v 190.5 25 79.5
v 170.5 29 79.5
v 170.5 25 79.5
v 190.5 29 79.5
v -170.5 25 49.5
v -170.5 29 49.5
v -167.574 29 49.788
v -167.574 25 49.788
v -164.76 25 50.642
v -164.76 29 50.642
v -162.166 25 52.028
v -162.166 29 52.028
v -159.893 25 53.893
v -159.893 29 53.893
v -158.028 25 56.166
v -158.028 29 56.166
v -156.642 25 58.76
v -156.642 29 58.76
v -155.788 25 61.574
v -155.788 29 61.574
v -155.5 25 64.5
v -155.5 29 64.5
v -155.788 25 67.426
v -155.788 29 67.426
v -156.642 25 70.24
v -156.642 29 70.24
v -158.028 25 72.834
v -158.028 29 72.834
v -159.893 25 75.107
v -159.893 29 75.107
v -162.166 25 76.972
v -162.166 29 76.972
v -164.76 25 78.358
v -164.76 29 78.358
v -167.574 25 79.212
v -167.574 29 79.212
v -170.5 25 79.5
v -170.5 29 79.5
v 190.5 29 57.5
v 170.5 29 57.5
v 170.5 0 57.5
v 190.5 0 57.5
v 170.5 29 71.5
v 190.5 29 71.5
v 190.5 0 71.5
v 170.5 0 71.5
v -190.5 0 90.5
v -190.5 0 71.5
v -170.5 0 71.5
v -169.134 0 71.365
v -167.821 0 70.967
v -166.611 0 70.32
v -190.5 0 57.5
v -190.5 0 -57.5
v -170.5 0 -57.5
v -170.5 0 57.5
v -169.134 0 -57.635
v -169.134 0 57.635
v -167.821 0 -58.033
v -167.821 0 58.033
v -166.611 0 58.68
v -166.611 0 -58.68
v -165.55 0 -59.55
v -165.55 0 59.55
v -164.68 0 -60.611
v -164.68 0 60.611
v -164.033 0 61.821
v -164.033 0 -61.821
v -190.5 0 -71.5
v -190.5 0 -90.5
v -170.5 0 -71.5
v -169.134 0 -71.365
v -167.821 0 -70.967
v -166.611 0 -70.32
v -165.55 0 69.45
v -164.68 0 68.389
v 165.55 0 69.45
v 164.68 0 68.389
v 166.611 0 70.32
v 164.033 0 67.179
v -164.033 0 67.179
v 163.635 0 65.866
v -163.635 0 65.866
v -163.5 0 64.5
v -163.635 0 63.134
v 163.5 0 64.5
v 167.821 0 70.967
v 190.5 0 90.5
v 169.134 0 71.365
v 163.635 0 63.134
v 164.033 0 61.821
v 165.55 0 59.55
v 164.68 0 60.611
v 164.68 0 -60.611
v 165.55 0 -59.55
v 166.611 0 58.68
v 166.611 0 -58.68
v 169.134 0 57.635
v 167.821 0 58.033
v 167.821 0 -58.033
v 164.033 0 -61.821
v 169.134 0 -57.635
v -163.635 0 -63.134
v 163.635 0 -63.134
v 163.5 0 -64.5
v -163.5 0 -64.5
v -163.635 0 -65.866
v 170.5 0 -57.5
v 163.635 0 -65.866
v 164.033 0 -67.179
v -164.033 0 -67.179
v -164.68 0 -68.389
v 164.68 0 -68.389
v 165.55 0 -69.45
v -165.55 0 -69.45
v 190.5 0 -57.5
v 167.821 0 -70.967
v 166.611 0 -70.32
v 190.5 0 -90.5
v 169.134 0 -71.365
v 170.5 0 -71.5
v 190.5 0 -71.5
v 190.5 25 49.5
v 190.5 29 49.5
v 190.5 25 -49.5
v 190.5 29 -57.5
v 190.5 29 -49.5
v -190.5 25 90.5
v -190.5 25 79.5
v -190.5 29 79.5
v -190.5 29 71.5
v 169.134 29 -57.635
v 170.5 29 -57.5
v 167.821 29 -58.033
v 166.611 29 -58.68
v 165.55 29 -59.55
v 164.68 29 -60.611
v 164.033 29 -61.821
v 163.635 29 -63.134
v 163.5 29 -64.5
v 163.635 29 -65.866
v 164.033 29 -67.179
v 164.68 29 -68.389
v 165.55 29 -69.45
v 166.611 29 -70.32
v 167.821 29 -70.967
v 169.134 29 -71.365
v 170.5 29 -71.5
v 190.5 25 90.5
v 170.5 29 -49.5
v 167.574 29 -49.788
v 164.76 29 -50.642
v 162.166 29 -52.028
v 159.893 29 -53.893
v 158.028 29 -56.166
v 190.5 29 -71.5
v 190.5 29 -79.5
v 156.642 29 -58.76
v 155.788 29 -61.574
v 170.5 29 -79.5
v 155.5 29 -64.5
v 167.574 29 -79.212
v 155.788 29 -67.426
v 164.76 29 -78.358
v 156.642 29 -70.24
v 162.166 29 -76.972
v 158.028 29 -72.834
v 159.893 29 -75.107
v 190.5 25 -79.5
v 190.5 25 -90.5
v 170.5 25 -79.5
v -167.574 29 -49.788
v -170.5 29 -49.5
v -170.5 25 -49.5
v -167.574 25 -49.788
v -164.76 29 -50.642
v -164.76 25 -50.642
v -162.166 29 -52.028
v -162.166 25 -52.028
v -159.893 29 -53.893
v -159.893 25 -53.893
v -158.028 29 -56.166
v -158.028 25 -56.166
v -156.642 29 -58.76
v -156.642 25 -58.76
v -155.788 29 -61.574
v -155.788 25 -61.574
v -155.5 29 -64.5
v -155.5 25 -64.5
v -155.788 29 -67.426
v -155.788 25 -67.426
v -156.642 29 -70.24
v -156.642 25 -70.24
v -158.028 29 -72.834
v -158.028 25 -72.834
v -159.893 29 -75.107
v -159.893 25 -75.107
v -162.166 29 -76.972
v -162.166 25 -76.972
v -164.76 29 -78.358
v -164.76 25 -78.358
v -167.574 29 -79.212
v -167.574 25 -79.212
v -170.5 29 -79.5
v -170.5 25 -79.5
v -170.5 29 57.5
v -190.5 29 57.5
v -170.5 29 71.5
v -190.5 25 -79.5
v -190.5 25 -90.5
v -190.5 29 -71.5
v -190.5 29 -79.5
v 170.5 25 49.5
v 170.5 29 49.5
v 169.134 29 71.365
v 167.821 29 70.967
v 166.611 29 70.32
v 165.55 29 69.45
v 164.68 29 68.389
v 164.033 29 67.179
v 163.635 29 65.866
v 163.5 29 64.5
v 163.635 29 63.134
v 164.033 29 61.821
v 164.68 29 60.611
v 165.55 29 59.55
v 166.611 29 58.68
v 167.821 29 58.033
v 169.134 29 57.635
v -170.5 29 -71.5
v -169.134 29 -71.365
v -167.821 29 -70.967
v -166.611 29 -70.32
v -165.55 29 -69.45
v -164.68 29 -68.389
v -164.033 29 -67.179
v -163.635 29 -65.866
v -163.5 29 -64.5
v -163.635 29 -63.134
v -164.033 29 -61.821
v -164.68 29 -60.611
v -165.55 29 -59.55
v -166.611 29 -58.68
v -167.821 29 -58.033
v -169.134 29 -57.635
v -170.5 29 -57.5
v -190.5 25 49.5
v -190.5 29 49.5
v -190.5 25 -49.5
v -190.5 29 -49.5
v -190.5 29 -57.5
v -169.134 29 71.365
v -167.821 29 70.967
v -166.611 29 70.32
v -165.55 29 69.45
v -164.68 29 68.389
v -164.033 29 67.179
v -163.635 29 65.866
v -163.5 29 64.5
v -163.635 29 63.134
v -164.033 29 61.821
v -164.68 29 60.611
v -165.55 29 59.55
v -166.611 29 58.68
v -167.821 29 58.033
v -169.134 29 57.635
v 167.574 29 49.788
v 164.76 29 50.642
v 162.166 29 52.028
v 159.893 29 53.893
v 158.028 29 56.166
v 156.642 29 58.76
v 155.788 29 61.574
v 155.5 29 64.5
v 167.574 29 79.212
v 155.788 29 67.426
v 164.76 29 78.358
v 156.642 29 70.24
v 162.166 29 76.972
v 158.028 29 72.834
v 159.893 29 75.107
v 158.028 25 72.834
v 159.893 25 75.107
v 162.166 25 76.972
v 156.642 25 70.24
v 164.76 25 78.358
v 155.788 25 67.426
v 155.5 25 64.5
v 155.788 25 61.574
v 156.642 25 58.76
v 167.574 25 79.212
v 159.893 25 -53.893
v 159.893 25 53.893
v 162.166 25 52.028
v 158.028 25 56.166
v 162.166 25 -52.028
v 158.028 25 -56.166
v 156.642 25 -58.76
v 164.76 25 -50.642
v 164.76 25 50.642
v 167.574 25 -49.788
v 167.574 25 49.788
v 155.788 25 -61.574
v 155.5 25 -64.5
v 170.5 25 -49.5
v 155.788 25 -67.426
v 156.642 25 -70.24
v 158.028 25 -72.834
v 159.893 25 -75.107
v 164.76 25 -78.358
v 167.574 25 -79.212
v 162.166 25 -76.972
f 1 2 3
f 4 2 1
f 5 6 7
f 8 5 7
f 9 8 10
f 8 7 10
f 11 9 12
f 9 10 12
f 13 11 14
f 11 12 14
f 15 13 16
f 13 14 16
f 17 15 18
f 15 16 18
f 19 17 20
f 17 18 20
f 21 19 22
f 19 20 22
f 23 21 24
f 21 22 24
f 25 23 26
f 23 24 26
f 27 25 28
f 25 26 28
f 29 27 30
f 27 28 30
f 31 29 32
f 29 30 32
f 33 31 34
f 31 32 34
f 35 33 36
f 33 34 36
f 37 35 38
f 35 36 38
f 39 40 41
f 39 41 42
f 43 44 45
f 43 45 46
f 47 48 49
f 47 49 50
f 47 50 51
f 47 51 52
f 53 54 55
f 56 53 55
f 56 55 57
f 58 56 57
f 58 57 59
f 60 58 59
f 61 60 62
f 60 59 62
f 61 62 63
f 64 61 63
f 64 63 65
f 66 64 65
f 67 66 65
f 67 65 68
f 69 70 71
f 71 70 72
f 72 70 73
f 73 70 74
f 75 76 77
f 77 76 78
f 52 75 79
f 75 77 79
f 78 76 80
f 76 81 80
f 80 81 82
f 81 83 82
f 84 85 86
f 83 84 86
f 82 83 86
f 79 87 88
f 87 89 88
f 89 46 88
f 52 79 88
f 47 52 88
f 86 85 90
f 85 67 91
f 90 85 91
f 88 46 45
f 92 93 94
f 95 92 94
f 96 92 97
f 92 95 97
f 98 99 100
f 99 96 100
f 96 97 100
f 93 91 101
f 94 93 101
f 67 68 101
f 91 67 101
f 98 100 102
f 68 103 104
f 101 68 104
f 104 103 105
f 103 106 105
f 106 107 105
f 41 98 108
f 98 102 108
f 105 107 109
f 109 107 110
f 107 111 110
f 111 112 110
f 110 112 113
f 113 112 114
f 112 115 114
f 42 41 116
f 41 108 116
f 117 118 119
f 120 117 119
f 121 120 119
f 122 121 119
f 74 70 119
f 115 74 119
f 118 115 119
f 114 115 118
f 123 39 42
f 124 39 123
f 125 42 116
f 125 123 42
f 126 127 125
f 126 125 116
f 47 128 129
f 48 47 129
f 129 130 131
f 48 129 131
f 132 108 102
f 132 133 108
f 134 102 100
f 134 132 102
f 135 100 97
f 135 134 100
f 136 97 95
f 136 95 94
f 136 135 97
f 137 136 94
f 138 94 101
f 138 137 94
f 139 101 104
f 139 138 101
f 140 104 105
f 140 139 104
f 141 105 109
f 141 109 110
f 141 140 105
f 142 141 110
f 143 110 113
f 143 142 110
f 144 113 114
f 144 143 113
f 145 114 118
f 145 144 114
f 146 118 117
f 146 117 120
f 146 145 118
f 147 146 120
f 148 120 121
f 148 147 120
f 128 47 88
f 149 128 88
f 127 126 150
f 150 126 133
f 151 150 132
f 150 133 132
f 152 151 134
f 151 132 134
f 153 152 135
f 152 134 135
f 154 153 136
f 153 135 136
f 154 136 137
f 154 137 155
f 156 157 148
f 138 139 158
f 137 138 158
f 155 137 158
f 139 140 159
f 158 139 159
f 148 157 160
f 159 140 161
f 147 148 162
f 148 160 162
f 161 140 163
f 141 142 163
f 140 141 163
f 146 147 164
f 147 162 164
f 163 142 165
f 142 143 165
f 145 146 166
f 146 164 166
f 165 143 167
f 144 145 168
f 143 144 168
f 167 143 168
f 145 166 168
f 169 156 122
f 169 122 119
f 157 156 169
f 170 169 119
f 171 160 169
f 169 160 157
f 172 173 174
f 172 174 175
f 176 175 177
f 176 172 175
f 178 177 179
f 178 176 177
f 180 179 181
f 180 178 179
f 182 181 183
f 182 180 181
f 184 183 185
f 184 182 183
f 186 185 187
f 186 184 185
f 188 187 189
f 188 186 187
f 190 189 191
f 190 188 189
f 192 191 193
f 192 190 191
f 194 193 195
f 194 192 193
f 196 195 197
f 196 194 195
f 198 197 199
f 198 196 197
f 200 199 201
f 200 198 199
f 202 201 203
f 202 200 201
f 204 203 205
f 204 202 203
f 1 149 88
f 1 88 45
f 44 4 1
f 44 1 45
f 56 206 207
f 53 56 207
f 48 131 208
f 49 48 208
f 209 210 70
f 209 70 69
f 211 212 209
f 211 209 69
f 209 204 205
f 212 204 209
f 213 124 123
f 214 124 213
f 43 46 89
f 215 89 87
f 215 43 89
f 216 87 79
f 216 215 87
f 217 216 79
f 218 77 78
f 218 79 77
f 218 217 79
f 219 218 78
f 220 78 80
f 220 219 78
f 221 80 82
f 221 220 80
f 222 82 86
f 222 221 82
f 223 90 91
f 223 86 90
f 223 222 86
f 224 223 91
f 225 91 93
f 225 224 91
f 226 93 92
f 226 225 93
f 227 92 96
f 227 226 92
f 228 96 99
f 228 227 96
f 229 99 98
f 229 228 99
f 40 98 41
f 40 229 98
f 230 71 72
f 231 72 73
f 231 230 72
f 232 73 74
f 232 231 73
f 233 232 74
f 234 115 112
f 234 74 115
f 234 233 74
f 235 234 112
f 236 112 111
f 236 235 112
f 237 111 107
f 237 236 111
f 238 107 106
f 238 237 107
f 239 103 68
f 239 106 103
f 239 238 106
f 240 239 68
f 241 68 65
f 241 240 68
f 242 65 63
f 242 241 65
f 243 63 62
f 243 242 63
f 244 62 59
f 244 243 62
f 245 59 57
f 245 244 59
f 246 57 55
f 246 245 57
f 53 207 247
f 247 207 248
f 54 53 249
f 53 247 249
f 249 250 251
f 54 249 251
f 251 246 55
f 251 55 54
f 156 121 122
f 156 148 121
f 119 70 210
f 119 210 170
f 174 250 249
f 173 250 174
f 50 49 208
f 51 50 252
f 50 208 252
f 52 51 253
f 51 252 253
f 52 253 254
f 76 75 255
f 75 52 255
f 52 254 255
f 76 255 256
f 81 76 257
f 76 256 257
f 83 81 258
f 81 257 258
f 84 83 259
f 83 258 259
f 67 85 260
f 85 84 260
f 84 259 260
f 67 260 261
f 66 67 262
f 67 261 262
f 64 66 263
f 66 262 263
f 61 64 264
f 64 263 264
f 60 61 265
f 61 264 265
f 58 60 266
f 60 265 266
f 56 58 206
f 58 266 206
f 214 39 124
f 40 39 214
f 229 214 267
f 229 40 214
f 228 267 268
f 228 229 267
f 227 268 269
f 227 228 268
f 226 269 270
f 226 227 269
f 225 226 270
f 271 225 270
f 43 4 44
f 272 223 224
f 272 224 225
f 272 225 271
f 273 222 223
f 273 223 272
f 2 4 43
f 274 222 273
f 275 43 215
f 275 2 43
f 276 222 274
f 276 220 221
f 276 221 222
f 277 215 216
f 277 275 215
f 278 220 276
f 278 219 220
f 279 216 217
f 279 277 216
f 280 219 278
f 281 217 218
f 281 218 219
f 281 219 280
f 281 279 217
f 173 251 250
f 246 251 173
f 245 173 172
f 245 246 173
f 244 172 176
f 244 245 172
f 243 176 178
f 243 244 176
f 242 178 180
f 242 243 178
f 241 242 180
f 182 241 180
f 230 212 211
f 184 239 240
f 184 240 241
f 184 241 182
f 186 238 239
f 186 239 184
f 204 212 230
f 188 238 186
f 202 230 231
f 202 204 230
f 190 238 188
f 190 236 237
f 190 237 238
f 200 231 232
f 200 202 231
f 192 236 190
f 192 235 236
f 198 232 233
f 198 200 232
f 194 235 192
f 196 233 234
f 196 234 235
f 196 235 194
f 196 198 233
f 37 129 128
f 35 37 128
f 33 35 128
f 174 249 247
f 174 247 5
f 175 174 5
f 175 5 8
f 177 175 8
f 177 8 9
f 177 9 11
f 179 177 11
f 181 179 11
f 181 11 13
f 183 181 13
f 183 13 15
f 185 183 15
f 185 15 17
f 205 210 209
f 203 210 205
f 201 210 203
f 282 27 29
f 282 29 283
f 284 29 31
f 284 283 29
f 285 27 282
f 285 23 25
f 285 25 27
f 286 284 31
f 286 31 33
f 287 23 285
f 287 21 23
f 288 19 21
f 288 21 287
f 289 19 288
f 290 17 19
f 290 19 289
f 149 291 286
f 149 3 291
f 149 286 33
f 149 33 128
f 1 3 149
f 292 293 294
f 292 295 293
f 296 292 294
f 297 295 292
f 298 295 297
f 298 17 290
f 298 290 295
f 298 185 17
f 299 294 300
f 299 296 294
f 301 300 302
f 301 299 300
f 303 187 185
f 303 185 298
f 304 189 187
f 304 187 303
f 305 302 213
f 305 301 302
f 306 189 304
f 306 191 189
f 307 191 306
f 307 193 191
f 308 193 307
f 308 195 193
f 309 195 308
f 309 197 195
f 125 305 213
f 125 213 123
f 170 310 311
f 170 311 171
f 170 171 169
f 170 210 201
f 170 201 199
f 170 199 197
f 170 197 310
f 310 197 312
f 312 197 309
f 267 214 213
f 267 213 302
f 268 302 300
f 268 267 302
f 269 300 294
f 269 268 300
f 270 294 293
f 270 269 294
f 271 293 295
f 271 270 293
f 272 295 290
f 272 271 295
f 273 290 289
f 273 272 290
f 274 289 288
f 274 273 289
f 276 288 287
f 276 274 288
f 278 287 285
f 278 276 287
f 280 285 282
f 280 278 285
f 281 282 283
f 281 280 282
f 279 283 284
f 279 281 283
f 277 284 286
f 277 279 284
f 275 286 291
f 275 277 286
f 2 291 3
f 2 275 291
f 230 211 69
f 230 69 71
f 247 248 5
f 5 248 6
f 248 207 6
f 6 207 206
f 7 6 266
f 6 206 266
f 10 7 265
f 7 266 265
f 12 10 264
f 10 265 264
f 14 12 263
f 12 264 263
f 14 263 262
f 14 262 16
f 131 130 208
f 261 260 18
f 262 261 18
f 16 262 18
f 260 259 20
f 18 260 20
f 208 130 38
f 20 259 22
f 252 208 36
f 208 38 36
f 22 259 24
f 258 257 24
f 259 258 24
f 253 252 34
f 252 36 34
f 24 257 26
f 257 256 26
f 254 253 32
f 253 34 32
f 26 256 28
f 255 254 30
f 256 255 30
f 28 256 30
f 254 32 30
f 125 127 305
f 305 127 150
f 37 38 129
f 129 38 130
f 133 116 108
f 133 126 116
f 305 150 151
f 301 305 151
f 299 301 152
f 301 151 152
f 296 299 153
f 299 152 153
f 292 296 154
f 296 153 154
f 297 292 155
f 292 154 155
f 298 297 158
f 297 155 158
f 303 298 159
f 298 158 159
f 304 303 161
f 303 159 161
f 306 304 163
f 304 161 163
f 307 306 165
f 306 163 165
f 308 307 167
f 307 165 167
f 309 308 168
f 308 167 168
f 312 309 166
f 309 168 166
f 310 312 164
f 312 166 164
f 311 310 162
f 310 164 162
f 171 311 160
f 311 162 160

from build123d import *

# Parameters (mm, degrees)
SKETCH_1_W            = 381
SKETCH_1_H            = 181
EXTRUDE_1_DEPTH       = 25
CUT_EXTRUDE_1_DEPTH   = 25
EXTRUDE_START         = 4
EXTRUDE_2_DEPTH       = 4
MIRROR_2_COPY_1_DEPTH = 25
MIRROR_START          = 4
MIRROR_2_COPY_2_DEPTH = 4
MIRROR_2_COPY_3_DEPTH = 25
MIRROR_2_COPY_4_DEPTH = 4


with BuildPart() as part:
    # 草图1 → 凸台-拉伸1 (new body)
    with BuildSketch(Plane(origin=(0, 0, 0), x_dir=(1, 0, 0), z_dir=(0, 1, 0))):
        Rectangle(SKETCH_1_W, SKETCH_1_H)
    extrude(amount=EXTRUDE_1_DEPTH)

    # 草图2 → 切除-拉伸1 (cut)
    with BuildSketch(Plane(origin=(0, 25, 0), x_dir=(1, 0, 0), z_dir=(0, 1, 0))):
        with BuildLine():
            Line((-190.5, 57.5), (-170.5, 57.5))
            ThreePointArc((-170.5, 57.5), (-163.5, 64.5), (-170.5, 71.5))
            Line((-170.5, 71.5), (-190.5, 71.5))
            Line((-190.5, 71.5), (-190.5, 57.5))
        make_face()
    cut_extrude_1 = extrude(amount=-CUT_EXTRUDE_1_DEPTH, mode=Mode.SUBTRACT)

    # 草图2<3> → 凸台-拉伸2 (add)
    with BuildSketch(Plane(origin=(0, 25, 0), x_dir=(1, 0, 0), z_dir=(0, 1, 0)).offset(EXTRUDE_START)):
        with BuildLine():
            ThreePointArc((-170.5, 71.5), (-163.5, 64.5), (-170.5, 57.5))
            Line((-170.5, 57.5), (-190.5, 57.5))
            Line((-190.5, 57.5), (-190.5, 49.5))
            Line((-190.5, 49.5), (-170.5, 49.5))
            ThreePointArc((-170.5, 49.5), (-155.5, 64.5), (-170.5, 79.5))
            Line((-170.5, 79.5), (-190.5, 79.5))
            Line((-190.5, 79.5), (-190.5, 71.5))
            Line((-190.5, 71.5), (-170.5, 71.5))
        make_face()
    extrude_2 = extrude(amount=-EXTRUDE_2_DEPTH)

    # 镜向1: 切除-拉伸1, 凸台-拉伸2 across plane
    add(cut_extrude_1.mirror(Plane.XY), mode=Mode.SUBTRACT)
    add(extrude_2.mirror(Plane.XY))

    # 镜向2 copy 1 sketch → 镜向2 copy 1 (cut)
    with BuildSketch(Plane(origin=(0, 25, 0), x_dir=(-1, 0, 0), z_dir=(0, 1, 0))):
        with BuildLine():
            Line((-190.5, 57.5), (-170.5, 57.5))
            ThreePointArc((-170.5, 57.5), (-163.5, 64.5), (-170.5, 71.5))
            Line((-170.5, 71.5), (-190.5, 71.5))
            Line((-190.5, 71.5), (-190.5, 57.5))
        make_face()
    extrude(amount=-MIRROR_2_COPY_1_DEPTH, mode=Mode.SUBTRACT)

    # 镜向2 copy 2 sketch → 镜向2 copy 2 (add)
    with BuildSketch(Plane(origin=(0, 25, 0), x_dir=(-1, 0, 0), z_dir=(0, 1, 0)).offset(MIRROR_START)):
        with BuildLine():
            ThreePointArc((-170.5, 71.5), (-163.5, 64.5), (-170.5, 57.5))
            Line((-170.5, 57.5), (-190.5, 57.5))
            Line((-190.5, 57.5), (-190.5, 49.5))
            Line((-190.5, 49.5), (-170.5, 49.5))
            ThreePointArc((-170.5, 49.5), (-155.5, 64.5), (-170.5, 79.5))
            Line((-170.5, 79.5), (-190.5, 79.5))
            Line((-190.5, 79.5), (-190.5, 71.5))
            Line((-190.5, 71.5), (-170.5, 71.5))
        make_face()
    extrude(amount=-MIRROR_2_COPY_2_DEPTH)

    # 镜向2 copy 3 sketch → 镜向2 copy 3 (cut)
    with BuildSketch(Plane(origin=(0, 25, 0), x_dir=(-1, 0, 0), z_dir=(0, 1, 0))):
        with BuildLine():
            Line((-190.5, -57.5), (-170.5, -57.5))
            ThreePointArc((-170.5, -57.5), (-163.5, -64.5), (-170.5, -71.5))
            Line((-170.5, -71.5), (-190.5, -71.5))
            Line((-190.5, -71.5), (-190.5, -57.5))
        make_face()
    extrude(amount=-MIRROR_2_COPY_3_DEPTH, mode=Mode.SUBTRACT)

    # 镜向2 copy 4 sketch → 镜向2 copy 4 (add)
    with BuildSketch(Plane(origin=(0, 25, 0), x_dir=(-1, 0, 0), z_dir=(0, 1, 0)).offset(MIRROR_START)):
        with BuildLine():
            ThreePointArc((-170.5, -71.5), (-163.5, -64.5), (-170.5, -57.5))
            Line((-170.5, -57.5), (-190.5, -57.5))
            Line((-190.5, -57.5), (-190.5, -49.5))
            Line((-190.5, -49.5), (-170.5, -49.5))
            ThreePointArc((-170.5, -49.5), (-155.5, -64.5), (-170.5, -79.5))
            Line((-170.5, -79.5), (-190.5, -79.5))
            Line((-190.5, -79.5), (-190.5, -71.5))
            Line((-190.5, -71.5), (-170.5, -71.5))
        make_face()
    extrude(amount=-MIRROR_2_COPY_4_DEPTH)


solid = part.part
